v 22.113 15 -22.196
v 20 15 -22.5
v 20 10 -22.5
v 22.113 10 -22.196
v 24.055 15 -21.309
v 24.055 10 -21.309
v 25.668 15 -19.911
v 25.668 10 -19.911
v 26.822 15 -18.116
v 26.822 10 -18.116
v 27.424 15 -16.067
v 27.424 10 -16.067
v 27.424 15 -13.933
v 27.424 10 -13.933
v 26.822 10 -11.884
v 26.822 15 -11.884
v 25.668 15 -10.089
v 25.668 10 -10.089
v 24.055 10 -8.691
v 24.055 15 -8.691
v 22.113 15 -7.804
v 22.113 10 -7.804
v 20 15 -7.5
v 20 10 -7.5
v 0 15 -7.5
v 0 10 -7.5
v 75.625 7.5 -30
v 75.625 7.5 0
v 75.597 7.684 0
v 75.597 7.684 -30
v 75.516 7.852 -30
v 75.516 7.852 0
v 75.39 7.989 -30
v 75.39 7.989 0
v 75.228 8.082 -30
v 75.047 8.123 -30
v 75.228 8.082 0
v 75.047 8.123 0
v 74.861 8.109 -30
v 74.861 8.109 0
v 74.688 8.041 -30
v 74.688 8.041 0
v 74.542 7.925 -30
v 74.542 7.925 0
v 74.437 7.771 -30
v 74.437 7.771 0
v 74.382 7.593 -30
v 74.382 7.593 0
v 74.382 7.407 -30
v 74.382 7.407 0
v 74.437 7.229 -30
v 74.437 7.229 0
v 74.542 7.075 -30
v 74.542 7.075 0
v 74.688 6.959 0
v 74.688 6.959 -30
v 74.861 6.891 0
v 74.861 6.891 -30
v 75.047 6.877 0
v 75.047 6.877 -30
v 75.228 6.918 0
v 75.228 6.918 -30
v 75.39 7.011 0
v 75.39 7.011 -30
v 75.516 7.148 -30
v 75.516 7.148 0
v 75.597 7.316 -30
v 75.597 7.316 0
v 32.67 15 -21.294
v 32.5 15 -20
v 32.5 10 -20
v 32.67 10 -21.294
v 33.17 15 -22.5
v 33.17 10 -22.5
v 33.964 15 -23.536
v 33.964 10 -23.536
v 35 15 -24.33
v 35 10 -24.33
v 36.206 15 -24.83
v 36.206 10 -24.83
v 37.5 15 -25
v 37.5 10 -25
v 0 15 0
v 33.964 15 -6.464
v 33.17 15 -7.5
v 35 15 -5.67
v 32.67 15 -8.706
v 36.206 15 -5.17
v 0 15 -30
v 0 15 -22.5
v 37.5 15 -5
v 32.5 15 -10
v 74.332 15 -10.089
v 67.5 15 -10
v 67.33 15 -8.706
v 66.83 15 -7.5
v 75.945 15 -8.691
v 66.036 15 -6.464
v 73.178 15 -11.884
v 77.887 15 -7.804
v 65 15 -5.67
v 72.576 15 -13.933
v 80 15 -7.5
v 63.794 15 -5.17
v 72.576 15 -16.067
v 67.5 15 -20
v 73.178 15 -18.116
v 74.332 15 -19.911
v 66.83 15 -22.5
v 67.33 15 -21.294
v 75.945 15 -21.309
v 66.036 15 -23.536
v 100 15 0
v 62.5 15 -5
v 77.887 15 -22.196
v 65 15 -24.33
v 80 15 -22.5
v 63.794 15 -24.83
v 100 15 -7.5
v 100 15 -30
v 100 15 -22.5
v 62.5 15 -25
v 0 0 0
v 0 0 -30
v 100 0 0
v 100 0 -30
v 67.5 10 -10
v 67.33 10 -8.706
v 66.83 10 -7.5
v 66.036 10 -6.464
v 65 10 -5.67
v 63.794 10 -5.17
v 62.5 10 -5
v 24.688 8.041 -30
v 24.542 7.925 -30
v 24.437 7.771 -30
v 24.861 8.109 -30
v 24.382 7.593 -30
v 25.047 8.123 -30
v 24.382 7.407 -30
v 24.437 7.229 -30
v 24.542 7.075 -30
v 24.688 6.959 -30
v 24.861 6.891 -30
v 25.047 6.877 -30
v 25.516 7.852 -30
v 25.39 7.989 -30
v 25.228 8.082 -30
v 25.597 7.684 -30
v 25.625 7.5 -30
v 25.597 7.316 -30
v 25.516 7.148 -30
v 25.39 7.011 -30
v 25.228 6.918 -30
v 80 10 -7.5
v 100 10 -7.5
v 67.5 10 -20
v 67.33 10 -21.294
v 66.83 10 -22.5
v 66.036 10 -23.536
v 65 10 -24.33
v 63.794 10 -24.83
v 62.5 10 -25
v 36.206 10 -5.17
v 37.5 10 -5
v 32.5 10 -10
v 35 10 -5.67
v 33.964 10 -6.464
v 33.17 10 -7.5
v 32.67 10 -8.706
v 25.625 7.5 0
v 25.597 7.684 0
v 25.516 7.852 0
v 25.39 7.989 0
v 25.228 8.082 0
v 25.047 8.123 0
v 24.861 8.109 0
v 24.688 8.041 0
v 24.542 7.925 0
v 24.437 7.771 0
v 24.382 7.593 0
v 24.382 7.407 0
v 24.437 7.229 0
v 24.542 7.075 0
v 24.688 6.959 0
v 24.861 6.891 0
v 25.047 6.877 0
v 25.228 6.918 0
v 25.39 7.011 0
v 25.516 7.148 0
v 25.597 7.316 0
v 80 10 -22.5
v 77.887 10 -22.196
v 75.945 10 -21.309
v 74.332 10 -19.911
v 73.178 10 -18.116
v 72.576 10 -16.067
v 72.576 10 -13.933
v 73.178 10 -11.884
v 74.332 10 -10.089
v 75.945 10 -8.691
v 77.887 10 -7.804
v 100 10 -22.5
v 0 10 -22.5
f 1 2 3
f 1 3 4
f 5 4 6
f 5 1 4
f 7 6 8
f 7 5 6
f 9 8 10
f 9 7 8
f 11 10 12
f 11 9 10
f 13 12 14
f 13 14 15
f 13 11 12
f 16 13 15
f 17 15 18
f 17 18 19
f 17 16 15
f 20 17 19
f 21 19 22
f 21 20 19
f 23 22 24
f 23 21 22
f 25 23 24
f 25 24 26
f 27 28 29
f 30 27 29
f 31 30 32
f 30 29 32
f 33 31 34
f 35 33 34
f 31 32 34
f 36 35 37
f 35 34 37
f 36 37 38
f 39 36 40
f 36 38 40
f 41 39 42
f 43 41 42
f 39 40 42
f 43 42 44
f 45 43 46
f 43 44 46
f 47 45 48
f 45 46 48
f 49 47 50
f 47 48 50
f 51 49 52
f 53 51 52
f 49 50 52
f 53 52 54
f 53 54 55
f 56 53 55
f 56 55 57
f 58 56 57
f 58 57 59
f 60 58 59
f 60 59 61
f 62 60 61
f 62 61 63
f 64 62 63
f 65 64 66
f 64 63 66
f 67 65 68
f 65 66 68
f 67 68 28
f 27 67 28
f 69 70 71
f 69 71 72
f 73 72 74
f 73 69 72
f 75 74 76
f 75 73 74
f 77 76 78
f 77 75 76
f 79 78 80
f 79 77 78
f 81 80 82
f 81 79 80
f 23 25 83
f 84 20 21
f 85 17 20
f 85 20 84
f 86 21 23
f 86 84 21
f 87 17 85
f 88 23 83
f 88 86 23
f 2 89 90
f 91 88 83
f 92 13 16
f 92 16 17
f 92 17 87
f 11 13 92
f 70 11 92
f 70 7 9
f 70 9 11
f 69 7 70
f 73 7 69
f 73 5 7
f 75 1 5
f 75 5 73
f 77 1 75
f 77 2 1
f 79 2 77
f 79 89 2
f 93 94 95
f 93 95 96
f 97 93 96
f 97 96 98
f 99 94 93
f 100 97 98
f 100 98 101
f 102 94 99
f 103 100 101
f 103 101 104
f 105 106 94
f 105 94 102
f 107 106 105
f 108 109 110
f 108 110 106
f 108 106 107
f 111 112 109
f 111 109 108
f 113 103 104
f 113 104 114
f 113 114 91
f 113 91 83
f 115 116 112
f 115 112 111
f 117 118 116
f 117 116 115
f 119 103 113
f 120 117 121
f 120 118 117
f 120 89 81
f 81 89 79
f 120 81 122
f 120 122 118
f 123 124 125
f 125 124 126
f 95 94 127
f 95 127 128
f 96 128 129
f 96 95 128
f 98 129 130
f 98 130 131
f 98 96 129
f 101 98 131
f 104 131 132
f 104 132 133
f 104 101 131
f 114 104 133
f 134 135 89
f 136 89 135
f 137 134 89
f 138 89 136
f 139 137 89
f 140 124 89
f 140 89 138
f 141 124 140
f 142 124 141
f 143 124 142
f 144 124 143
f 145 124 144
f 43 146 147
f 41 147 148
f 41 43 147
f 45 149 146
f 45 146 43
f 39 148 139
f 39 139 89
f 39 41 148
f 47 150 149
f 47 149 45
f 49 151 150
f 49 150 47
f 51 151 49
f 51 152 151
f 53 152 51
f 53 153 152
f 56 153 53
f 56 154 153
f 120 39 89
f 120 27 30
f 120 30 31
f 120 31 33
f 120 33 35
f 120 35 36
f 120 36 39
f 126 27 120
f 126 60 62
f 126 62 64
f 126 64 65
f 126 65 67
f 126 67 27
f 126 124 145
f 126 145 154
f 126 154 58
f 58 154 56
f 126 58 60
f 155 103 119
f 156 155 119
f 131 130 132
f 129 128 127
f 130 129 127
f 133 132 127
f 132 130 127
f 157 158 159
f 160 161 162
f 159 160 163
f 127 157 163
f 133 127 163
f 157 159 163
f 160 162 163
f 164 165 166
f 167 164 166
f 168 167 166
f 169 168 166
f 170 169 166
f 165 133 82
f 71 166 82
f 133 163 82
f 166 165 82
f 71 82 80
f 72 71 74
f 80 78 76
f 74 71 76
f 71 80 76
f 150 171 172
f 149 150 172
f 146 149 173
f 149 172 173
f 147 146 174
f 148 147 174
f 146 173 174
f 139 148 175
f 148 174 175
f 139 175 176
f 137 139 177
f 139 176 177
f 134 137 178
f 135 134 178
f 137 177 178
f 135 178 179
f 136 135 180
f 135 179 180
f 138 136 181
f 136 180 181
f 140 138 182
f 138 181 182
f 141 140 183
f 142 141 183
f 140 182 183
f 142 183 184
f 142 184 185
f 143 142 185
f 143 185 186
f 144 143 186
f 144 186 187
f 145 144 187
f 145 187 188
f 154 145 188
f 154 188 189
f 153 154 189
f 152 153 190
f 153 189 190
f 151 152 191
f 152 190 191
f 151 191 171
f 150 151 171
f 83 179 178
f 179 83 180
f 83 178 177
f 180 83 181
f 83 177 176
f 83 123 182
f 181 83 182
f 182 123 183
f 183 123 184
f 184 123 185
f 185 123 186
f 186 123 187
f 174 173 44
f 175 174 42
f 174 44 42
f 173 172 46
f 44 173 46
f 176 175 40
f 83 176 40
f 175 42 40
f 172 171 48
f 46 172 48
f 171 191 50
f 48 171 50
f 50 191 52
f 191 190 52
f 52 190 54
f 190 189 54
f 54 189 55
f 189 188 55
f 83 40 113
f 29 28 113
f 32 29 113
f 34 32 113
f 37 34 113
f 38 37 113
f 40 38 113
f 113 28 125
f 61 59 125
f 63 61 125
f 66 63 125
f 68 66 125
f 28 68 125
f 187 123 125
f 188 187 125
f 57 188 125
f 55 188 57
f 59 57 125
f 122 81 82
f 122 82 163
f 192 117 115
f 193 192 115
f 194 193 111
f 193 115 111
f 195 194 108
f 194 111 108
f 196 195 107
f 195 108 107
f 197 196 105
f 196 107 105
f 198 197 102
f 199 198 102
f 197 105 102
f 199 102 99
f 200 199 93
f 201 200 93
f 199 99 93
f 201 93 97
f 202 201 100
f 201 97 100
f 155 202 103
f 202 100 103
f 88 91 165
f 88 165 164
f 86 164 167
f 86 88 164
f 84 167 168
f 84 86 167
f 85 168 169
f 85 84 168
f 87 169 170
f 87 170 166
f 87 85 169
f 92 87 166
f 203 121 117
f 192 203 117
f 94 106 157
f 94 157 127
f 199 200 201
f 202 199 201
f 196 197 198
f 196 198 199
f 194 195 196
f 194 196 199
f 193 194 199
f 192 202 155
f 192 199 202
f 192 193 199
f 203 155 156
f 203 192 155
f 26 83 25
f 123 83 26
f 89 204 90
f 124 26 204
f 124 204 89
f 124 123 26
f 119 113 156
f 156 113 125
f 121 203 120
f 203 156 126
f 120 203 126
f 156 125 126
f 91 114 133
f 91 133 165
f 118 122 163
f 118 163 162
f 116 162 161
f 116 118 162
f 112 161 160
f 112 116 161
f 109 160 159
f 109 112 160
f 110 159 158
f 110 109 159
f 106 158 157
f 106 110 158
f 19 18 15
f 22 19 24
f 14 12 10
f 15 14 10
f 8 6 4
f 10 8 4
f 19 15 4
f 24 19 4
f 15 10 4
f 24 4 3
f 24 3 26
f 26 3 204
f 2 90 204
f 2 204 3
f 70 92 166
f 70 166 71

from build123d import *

# Parameters (mm, degrees)
SKETCH1_W           = 100
SKETCH1_H           = 30
BOSS_EXTRUDE1_DEPTH = 15
CUT_EXTRUDE1_DEPTH  = 5
SKETCH3_R           = 0.625
CUT_EXTRUDE2_DEPTH  = 30
CUT_EXTRUDE3_DEPTH  = 5


with BuildPart() as part:
    # Sketch1 → Boss-Extrude1 (new body)
    with BuildSketch(Plane(origin=(0, 0, 0), x_dir=(1, 0, 0), z_dir=(0, 1, 0))):
        with Locations((50, 15)):
            Rectangle(SKETCH1_W, SKETCH1_H)
    extrude(amount=BOSS_EXTRUDE1_DEPTH)

    # Sketch2 → Cut-Extrude1 (cut)
    with BuildSketch(Plane(origin=(0, 15, 0), x_dir=(1, 0, 0), z_dir=(0, 1, 0))):
        with BuildLine():
            Line((-20, 22.5), (20, 22.5))
            ThreePointArc((20, 22.5), (27.5, 15), (20, 7.5))
            Line((20, 7.5), (-20, 7.5))
            ThreePointArc((-20, 7.5), (-27.5, 15), (-20, 22.5))
        make_face()
        with BuildLine():
            Line((120, 22.5), (80, 22.5))
            ThreePointArc((80, 22.5), (72.5, 15), (80, 7.5))
            Line((80, 7.5), (120, 7.5))
            ThreePointArc((120, 7.5), (127.5, 15), (120, 22.5))
        make_face()
    extrude(amount=-CUT_EXTRUDE1_DEPTH, mode=Mode.SUBTRACT)

    # Sketch3 → Cut-Extrude2 (cut)
    with BuildSketch(Plane.XY):
        with Locations((25, 7.5)):
            Circle(SKETCH3_R)
        with Locations((75, 7.5)):
            Circle(SKETCH3_R)
    extrude(amount=-CUT_EXTRUDE2_DEPTH, mode=Mode.SUBTRACT)

    # Sketch4 → Cut-Extrude3 (cut)
    with BuildSketch(Plane(origin=(0, 15, 0), x_dir=(1, 0, 0), z_dir=(0, 1, 0))):
        with BuildLine():
            Line((37.5, 25), (62.5, 25))
            ThreePointArc((62.5, 25), (66.035533906, 23.535533906), (67.5, 20))
            Line((67.5, 20), (67.5, 10))
            ThreePointArc((67.5, 10), (66.035533906, 6.464466094), (62.5, 5))
            Line((62.5, 5), (37.5, 5))
            ThreePointArc((37.5, 5), (33.964466094, 6.464466094), (32.5, 10))
            Line((32.5, 10), (32.5, 20))
            ThreePointArc((32.5, 20), (33.964466094, 23.535533906), (37.5, 25))
        make_face()
    extrude(amount=-CUT_EXTRUDE3_DEPTH, mode=Mode.SUBTRACT)


solid = part.part
